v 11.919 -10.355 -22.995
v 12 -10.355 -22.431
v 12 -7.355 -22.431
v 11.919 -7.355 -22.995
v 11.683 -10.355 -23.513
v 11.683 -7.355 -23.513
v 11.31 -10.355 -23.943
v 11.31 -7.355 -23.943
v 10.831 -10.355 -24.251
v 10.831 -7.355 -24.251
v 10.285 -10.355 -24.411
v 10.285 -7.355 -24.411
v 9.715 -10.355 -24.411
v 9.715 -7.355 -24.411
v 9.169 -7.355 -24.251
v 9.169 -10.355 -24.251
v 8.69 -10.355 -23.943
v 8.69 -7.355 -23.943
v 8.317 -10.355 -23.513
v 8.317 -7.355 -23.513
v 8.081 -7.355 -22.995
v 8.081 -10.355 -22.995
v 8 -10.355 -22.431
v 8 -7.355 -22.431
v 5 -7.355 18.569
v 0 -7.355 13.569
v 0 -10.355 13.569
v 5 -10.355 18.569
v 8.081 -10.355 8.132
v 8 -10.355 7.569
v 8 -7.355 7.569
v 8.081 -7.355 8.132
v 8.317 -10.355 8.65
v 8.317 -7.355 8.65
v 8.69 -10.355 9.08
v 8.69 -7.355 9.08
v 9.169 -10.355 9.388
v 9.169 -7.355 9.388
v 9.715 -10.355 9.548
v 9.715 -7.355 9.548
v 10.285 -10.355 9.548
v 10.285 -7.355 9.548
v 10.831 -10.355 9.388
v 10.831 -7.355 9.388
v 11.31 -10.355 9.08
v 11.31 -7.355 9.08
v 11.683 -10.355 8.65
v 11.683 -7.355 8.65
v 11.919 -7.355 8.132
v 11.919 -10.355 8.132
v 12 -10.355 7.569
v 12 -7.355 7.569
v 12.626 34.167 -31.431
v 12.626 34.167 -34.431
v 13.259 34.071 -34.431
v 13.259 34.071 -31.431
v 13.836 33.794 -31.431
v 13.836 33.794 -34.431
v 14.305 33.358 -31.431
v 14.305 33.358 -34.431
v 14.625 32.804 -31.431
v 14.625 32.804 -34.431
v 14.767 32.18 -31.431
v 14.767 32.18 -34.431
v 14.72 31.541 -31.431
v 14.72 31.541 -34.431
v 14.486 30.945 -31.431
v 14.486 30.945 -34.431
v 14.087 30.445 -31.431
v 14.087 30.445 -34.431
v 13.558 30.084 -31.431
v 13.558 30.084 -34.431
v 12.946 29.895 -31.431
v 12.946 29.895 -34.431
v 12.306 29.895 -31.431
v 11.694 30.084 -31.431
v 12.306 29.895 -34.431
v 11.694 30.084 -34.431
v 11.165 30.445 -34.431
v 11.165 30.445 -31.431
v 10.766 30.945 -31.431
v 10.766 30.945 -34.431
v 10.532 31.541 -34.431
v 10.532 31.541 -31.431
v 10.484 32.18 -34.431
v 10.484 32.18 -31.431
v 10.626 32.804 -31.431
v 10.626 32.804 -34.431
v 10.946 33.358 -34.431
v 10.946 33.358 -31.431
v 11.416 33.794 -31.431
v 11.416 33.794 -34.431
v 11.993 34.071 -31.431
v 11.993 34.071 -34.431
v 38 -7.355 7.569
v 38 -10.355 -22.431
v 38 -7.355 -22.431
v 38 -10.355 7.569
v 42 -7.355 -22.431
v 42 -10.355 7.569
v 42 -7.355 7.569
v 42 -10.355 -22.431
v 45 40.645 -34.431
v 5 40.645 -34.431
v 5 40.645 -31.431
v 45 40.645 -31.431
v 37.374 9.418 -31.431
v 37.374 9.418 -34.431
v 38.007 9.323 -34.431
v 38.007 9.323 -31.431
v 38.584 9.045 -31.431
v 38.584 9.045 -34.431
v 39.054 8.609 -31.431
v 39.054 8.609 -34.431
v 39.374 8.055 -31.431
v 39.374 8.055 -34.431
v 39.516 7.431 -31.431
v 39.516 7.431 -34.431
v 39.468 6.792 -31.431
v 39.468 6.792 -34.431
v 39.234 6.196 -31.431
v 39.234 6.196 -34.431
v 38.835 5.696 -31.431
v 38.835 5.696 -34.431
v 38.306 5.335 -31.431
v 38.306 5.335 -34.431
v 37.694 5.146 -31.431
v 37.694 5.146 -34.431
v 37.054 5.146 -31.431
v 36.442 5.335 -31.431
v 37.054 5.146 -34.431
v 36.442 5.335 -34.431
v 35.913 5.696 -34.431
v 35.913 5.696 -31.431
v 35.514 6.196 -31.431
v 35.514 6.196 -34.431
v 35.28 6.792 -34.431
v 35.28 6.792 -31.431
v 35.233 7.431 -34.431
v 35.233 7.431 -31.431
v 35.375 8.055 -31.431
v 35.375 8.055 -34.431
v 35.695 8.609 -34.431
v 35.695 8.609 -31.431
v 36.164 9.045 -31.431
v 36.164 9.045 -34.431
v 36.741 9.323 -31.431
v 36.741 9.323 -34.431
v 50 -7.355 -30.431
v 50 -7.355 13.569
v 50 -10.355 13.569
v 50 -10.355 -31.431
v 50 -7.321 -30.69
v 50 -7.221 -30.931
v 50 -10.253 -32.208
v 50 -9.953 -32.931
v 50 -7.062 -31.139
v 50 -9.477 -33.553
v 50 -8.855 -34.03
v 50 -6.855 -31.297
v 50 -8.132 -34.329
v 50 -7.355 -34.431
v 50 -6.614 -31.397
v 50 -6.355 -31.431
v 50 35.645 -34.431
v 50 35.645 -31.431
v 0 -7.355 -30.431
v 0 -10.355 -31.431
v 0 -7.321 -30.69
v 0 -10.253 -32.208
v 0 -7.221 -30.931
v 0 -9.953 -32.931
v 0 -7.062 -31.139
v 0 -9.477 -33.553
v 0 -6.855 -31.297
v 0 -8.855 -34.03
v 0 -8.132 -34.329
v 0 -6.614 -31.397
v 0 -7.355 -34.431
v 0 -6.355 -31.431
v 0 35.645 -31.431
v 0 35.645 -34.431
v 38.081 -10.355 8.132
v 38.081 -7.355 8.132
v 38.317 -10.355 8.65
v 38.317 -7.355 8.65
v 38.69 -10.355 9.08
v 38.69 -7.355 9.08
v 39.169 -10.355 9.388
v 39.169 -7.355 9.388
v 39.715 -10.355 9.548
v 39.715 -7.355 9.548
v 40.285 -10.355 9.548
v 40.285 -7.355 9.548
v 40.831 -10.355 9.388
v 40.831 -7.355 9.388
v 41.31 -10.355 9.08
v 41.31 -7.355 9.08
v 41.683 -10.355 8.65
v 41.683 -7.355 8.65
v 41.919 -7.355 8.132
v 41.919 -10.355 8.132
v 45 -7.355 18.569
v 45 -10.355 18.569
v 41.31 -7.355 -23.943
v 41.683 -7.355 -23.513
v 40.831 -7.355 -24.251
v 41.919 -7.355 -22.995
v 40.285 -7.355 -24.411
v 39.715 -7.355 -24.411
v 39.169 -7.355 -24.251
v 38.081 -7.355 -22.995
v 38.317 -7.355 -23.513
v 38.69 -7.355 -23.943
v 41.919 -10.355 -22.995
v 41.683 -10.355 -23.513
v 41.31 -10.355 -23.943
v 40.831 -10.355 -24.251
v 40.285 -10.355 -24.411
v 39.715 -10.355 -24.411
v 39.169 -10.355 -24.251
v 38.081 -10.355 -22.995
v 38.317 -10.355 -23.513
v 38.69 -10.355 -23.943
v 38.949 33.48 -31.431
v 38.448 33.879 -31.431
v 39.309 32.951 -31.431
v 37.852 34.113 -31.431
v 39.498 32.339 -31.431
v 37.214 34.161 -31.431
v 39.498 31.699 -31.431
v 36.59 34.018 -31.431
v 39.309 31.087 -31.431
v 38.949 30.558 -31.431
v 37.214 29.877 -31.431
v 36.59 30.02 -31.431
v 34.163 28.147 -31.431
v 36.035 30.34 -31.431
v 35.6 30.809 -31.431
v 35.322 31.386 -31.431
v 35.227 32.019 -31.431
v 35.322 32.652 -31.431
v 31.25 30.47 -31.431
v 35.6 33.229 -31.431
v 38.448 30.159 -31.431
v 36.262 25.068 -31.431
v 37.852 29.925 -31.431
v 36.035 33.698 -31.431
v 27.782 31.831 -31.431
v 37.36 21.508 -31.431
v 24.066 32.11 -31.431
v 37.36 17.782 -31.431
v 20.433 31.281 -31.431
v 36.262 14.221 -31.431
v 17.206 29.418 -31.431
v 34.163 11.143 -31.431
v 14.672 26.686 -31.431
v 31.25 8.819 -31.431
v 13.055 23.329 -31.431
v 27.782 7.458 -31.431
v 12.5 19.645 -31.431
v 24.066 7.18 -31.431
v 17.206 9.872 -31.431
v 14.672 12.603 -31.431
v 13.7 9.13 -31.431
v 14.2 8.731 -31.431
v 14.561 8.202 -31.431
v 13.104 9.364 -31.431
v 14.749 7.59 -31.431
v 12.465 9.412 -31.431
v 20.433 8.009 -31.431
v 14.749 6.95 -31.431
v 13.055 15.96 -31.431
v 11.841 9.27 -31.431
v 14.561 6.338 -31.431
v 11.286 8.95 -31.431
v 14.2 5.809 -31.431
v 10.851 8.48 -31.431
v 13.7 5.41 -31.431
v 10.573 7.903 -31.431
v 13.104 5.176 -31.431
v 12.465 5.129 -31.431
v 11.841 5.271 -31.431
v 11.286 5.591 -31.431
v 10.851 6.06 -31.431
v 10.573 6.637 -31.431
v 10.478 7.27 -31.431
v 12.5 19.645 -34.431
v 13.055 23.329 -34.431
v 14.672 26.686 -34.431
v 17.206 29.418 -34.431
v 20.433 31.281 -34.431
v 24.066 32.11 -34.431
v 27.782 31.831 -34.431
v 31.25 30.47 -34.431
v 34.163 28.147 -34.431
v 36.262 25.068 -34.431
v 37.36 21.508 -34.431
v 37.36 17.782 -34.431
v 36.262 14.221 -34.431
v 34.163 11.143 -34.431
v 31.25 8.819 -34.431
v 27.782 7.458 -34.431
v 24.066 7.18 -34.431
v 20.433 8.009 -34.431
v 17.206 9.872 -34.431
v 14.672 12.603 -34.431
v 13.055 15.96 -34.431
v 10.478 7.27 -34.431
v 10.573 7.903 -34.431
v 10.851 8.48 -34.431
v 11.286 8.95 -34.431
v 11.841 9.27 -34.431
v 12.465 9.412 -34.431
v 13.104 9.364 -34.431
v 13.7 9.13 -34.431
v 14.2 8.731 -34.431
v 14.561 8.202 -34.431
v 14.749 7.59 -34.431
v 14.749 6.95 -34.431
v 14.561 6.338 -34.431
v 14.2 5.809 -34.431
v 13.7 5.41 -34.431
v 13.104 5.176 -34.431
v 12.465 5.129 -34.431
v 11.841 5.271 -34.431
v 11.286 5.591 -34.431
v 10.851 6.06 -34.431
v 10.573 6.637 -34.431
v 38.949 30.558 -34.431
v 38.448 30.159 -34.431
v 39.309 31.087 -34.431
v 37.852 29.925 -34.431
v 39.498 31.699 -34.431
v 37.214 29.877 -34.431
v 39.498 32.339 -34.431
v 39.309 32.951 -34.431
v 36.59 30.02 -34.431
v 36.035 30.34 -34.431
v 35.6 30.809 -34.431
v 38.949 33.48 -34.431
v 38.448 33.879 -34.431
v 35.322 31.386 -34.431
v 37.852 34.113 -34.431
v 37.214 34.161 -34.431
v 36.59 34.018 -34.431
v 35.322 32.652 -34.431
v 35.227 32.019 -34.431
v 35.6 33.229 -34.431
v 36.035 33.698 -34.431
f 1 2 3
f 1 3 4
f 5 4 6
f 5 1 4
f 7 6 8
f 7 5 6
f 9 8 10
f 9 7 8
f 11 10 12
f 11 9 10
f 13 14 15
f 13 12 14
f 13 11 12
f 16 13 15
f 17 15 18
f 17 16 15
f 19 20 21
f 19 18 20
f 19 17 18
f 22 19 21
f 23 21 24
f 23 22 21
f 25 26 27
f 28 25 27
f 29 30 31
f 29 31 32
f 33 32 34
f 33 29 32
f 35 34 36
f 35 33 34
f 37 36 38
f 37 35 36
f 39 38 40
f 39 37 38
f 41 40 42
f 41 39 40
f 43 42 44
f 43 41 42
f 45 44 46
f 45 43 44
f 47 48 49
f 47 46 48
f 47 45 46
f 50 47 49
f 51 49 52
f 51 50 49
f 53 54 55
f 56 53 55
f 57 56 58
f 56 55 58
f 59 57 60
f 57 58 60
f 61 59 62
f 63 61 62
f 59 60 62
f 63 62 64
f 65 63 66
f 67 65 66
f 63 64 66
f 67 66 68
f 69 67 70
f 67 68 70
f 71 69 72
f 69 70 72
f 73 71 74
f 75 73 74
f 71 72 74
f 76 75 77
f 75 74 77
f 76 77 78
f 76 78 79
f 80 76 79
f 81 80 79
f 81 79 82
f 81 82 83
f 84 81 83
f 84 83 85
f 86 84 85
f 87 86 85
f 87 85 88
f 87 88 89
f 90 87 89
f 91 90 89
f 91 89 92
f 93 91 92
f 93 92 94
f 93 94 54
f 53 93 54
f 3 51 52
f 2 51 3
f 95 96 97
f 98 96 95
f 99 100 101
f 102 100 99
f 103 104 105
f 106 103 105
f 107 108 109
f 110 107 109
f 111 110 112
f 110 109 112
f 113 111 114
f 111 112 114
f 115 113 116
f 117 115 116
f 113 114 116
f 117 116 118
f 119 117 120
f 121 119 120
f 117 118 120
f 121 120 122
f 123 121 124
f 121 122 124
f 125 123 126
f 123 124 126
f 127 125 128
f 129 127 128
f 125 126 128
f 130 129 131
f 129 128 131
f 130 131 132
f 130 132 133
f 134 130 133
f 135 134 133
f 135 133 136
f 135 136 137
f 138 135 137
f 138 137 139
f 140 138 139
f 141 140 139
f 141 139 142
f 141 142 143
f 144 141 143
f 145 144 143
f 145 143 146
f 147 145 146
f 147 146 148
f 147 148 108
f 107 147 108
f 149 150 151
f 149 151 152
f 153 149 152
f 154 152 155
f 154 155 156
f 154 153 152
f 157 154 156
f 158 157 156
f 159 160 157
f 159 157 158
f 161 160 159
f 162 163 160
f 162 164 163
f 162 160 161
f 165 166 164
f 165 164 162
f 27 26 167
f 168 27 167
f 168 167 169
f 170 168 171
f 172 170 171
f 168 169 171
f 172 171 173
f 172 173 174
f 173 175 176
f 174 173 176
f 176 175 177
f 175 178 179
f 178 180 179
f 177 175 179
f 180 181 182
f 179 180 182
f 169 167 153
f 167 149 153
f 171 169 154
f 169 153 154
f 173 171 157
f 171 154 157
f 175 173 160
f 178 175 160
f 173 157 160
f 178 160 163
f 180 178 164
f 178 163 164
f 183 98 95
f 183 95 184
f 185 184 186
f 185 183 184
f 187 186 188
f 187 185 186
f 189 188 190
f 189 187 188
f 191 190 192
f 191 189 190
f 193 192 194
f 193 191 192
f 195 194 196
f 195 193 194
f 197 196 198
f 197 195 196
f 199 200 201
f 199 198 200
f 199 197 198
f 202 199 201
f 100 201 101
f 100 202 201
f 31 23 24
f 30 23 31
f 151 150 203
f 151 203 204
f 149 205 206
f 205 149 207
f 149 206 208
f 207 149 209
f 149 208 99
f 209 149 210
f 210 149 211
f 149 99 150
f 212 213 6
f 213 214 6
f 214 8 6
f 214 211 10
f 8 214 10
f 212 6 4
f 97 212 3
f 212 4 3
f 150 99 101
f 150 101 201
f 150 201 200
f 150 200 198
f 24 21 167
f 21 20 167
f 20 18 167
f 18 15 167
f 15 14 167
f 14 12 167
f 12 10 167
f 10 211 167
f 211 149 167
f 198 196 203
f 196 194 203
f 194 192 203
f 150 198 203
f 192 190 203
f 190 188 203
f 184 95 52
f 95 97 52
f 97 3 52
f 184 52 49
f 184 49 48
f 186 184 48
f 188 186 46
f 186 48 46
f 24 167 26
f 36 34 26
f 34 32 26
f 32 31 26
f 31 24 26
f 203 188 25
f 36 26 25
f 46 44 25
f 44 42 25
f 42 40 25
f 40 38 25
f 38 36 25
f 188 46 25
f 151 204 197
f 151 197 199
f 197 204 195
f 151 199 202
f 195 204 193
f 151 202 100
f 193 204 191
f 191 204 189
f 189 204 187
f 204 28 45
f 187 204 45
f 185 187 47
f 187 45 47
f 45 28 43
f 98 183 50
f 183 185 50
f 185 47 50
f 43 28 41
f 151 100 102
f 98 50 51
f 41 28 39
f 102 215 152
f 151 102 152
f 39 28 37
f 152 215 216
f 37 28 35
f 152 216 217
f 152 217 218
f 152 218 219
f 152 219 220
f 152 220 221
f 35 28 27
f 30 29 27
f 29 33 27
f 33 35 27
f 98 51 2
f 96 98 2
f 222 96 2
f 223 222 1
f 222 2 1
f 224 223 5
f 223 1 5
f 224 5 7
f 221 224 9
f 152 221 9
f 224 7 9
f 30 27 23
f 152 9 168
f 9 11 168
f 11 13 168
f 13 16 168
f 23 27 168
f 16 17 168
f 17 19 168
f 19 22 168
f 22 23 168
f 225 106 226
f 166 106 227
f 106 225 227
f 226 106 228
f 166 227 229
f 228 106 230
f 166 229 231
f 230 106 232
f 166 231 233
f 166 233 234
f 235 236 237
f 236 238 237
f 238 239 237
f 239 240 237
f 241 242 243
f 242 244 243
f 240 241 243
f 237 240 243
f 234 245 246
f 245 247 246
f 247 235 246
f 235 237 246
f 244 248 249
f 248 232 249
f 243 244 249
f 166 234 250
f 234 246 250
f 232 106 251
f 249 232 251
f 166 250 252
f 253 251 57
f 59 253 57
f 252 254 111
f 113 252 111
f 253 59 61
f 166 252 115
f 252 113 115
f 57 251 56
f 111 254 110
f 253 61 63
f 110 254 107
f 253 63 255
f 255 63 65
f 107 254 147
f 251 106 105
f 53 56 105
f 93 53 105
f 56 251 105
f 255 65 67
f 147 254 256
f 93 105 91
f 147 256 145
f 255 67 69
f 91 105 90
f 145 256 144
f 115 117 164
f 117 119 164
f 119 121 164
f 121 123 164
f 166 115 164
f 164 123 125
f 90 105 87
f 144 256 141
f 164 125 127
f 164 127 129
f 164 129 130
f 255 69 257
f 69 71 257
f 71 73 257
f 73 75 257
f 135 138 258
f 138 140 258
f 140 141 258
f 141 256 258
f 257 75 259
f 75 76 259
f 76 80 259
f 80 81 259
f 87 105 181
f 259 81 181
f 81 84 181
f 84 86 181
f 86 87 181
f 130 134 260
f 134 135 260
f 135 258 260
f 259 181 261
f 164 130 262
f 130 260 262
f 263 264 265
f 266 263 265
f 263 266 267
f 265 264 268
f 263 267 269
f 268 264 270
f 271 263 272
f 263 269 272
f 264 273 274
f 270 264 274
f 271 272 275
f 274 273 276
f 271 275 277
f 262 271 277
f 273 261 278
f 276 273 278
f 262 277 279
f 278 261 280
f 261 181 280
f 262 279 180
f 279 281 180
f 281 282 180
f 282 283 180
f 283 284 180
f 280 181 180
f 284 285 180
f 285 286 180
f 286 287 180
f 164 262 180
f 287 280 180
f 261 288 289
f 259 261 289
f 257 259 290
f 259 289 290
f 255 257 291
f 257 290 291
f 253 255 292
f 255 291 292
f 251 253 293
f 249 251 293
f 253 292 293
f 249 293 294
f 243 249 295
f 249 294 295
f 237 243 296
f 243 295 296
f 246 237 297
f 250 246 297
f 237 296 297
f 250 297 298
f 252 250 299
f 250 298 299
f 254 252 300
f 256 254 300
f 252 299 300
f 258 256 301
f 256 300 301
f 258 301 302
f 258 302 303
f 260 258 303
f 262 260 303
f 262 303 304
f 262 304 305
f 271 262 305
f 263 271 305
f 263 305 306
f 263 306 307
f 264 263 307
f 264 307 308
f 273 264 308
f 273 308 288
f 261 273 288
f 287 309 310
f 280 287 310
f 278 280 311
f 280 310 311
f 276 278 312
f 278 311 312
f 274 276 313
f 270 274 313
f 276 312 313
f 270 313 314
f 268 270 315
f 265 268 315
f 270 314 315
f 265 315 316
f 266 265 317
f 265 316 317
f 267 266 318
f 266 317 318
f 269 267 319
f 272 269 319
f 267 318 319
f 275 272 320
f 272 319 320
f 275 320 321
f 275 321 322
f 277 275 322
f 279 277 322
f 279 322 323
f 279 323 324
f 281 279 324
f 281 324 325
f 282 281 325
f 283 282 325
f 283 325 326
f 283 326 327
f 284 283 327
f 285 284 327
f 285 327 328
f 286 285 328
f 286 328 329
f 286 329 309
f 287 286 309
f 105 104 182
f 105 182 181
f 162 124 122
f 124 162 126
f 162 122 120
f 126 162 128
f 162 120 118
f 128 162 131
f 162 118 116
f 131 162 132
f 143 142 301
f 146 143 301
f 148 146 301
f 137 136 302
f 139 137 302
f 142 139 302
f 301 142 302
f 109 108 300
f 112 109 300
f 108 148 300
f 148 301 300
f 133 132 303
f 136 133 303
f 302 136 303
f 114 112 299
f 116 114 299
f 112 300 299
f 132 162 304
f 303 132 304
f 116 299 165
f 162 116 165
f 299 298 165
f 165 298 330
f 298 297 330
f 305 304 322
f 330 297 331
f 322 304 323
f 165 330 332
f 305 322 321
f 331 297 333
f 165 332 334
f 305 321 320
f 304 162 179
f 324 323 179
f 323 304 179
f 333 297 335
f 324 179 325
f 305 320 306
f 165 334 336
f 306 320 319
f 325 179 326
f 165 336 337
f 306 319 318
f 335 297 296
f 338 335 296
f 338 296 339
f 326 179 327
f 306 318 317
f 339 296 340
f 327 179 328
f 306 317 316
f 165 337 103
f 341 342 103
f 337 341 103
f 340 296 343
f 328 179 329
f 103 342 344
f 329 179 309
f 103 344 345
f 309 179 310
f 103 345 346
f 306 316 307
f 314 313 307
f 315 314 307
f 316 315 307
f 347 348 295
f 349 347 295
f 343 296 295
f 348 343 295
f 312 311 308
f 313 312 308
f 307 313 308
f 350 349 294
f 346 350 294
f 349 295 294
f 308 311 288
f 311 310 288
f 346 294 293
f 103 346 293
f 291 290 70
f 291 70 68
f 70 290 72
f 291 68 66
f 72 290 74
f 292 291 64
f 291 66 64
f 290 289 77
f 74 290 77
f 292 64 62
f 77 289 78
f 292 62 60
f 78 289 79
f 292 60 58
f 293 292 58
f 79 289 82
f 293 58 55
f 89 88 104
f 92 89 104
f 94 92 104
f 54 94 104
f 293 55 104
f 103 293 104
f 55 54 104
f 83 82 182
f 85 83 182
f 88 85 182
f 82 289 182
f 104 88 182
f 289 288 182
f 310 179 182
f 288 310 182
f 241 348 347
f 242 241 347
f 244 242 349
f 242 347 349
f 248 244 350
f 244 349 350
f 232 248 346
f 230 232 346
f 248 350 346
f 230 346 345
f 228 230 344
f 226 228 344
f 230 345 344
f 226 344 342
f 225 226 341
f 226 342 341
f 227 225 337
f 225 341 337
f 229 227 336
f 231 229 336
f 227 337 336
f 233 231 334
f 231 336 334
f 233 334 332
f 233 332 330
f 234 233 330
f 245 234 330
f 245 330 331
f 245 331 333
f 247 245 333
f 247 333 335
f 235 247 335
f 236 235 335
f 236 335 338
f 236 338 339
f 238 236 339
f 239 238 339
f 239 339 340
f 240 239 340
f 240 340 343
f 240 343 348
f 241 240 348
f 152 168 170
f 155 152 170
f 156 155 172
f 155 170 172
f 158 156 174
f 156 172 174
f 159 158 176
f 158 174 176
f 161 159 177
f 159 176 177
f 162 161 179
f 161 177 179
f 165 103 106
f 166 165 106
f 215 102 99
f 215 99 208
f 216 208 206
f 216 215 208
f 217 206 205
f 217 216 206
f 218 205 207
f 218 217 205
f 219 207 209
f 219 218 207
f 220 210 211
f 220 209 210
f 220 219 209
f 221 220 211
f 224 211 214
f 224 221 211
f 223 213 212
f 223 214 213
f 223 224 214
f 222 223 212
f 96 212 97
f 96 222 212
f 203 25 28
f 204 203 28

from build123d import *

# Parameters (mm, degrees)
EXTRUDE_1_DEPTH     = 50
CHAMFER_1_SIZE      = 5
FILLET_1_R          = 1
SKETCH_2_R          = 12.5
SKETCH_2_R_2        = 2.147801841
CUT_EXTRUDE_1_DEPTH = 84.432542833
CUT_EXTRUDE_2_DEPTH = 80.287617379


with BuildPart() as part:
    # 스케치1 → 보스-돌출1 (new body)
    with BuildSketch(Plane(origin=(0, 0, 0), x_dir=(0, 0, -1), z_dir=(1, 0, 0))):
        with BuildLine():
            Line((-18.568527919, -10.355329949), (31.431472081, -10.355329949))
            ThreePointArc((31.431472081, -10.355329949), (33.552792425, -9.476650293), (34.431472081, -7.355329949))
            Line((34.431472081, -7.355329949), (34.431472081, 40.644670051))
            Line((34.431472081, 40.644670051), (31.431472081, 40.644670051))
            Line((31.431472081, 40.644670051), (31.431472081, -7.355329949))
            Line((31.431472081, -7.355329949), (-18.568527919, -7.355329949))
            Line((-18.568527919, -7.355329949), (-18.568527919, -10.355329949))
        make_face()
    extrude(amount=EXTRUDE_1_DEPTH)

    # 모따기1
    chamfer_1_edges = [part.edges().sort_by_distance(p)[0] for p in [
        (0, -8.855329949, 18.568527919),
        (50, 40.644670051, -32.931472081),
        (50, -8.855329949, 18.568527919),
        (0, 40.644670051, -32.931472081),
    ]]
    chamfer(chamfer_1_edges, length=CHAMFER_1_SIZE)

    # 필렛1
    fillet_1_edges = [part.edges().sort_by_distance(p)[0] for p in [
        (25, -7.355329949, -31.431472081),
    ]]
    fillet(fillet_1_edges, radius=FILLET_1_R)

    # 스케치2 → 컷-돌출1 (cut, through all)
    with BuildSketch(Plane(origin=(0, 0, -34.431472081), x_dir=(-1, 0, 0), z_dir=(0, 0, -1))):
        with Locations((-25, 19.644670051)):
            Circle(SKETCH_2_R)
        with Locations((-37.374368671, 32.019038722)):
            Circle(SKETCH_2_R_2)
        with Locations(Location((-12.625631329, 32.019038722, 0), (0, 0, 90))):
            Circle(SKETCH_2_R_2)
        with Locations((-12.625631329, 7.27030138)):
            Circle(SKETCH_2_R_2)
        with Locations(Location((-37.374368671, 7.27030138, 0), (0, 0, 90))):
            Circle(SKETCH_2_R_2)
    extrude(amount=-CUT_EXTRUDE_1_DEPTH, mode=Mode.SUBTRACT)

    # 스케치3 → 컷-돌출2 (cut, through all)
    with BuildSketch(Plane.XZ.offset(10.355329949)):
        with BuildLine():
            Line((12, 7.568527919), (12, -22.431472081))
            ThreePointArc((12, -22.431472081), (10, -24.431472081), (8, -22.431472081))
            Line((8, -22.431472081), (8, 7.568527919))
            ThreePointArc((8, 7.568527919), (10, 9.568527919), (12, 7.568527919))
        make_face()
        with BuildLine():
            Line((42, 7.568527919), (42, -22.431472081))
            ThreePointArc((42, -22.431472081), (40, -24.431472081), (38, -22.431472081))
            Line((38, -22.431472081), (38, 7.568527919))
            ThreePointArc((38, 7.568527919), (40, 9.568527919), (42, 7.568527919))
        make_face()
    extrude(amount=-CUT_EXTRUDE_2_DEPTH, mode=Mode.SUBTRACT)


solid = part.part
